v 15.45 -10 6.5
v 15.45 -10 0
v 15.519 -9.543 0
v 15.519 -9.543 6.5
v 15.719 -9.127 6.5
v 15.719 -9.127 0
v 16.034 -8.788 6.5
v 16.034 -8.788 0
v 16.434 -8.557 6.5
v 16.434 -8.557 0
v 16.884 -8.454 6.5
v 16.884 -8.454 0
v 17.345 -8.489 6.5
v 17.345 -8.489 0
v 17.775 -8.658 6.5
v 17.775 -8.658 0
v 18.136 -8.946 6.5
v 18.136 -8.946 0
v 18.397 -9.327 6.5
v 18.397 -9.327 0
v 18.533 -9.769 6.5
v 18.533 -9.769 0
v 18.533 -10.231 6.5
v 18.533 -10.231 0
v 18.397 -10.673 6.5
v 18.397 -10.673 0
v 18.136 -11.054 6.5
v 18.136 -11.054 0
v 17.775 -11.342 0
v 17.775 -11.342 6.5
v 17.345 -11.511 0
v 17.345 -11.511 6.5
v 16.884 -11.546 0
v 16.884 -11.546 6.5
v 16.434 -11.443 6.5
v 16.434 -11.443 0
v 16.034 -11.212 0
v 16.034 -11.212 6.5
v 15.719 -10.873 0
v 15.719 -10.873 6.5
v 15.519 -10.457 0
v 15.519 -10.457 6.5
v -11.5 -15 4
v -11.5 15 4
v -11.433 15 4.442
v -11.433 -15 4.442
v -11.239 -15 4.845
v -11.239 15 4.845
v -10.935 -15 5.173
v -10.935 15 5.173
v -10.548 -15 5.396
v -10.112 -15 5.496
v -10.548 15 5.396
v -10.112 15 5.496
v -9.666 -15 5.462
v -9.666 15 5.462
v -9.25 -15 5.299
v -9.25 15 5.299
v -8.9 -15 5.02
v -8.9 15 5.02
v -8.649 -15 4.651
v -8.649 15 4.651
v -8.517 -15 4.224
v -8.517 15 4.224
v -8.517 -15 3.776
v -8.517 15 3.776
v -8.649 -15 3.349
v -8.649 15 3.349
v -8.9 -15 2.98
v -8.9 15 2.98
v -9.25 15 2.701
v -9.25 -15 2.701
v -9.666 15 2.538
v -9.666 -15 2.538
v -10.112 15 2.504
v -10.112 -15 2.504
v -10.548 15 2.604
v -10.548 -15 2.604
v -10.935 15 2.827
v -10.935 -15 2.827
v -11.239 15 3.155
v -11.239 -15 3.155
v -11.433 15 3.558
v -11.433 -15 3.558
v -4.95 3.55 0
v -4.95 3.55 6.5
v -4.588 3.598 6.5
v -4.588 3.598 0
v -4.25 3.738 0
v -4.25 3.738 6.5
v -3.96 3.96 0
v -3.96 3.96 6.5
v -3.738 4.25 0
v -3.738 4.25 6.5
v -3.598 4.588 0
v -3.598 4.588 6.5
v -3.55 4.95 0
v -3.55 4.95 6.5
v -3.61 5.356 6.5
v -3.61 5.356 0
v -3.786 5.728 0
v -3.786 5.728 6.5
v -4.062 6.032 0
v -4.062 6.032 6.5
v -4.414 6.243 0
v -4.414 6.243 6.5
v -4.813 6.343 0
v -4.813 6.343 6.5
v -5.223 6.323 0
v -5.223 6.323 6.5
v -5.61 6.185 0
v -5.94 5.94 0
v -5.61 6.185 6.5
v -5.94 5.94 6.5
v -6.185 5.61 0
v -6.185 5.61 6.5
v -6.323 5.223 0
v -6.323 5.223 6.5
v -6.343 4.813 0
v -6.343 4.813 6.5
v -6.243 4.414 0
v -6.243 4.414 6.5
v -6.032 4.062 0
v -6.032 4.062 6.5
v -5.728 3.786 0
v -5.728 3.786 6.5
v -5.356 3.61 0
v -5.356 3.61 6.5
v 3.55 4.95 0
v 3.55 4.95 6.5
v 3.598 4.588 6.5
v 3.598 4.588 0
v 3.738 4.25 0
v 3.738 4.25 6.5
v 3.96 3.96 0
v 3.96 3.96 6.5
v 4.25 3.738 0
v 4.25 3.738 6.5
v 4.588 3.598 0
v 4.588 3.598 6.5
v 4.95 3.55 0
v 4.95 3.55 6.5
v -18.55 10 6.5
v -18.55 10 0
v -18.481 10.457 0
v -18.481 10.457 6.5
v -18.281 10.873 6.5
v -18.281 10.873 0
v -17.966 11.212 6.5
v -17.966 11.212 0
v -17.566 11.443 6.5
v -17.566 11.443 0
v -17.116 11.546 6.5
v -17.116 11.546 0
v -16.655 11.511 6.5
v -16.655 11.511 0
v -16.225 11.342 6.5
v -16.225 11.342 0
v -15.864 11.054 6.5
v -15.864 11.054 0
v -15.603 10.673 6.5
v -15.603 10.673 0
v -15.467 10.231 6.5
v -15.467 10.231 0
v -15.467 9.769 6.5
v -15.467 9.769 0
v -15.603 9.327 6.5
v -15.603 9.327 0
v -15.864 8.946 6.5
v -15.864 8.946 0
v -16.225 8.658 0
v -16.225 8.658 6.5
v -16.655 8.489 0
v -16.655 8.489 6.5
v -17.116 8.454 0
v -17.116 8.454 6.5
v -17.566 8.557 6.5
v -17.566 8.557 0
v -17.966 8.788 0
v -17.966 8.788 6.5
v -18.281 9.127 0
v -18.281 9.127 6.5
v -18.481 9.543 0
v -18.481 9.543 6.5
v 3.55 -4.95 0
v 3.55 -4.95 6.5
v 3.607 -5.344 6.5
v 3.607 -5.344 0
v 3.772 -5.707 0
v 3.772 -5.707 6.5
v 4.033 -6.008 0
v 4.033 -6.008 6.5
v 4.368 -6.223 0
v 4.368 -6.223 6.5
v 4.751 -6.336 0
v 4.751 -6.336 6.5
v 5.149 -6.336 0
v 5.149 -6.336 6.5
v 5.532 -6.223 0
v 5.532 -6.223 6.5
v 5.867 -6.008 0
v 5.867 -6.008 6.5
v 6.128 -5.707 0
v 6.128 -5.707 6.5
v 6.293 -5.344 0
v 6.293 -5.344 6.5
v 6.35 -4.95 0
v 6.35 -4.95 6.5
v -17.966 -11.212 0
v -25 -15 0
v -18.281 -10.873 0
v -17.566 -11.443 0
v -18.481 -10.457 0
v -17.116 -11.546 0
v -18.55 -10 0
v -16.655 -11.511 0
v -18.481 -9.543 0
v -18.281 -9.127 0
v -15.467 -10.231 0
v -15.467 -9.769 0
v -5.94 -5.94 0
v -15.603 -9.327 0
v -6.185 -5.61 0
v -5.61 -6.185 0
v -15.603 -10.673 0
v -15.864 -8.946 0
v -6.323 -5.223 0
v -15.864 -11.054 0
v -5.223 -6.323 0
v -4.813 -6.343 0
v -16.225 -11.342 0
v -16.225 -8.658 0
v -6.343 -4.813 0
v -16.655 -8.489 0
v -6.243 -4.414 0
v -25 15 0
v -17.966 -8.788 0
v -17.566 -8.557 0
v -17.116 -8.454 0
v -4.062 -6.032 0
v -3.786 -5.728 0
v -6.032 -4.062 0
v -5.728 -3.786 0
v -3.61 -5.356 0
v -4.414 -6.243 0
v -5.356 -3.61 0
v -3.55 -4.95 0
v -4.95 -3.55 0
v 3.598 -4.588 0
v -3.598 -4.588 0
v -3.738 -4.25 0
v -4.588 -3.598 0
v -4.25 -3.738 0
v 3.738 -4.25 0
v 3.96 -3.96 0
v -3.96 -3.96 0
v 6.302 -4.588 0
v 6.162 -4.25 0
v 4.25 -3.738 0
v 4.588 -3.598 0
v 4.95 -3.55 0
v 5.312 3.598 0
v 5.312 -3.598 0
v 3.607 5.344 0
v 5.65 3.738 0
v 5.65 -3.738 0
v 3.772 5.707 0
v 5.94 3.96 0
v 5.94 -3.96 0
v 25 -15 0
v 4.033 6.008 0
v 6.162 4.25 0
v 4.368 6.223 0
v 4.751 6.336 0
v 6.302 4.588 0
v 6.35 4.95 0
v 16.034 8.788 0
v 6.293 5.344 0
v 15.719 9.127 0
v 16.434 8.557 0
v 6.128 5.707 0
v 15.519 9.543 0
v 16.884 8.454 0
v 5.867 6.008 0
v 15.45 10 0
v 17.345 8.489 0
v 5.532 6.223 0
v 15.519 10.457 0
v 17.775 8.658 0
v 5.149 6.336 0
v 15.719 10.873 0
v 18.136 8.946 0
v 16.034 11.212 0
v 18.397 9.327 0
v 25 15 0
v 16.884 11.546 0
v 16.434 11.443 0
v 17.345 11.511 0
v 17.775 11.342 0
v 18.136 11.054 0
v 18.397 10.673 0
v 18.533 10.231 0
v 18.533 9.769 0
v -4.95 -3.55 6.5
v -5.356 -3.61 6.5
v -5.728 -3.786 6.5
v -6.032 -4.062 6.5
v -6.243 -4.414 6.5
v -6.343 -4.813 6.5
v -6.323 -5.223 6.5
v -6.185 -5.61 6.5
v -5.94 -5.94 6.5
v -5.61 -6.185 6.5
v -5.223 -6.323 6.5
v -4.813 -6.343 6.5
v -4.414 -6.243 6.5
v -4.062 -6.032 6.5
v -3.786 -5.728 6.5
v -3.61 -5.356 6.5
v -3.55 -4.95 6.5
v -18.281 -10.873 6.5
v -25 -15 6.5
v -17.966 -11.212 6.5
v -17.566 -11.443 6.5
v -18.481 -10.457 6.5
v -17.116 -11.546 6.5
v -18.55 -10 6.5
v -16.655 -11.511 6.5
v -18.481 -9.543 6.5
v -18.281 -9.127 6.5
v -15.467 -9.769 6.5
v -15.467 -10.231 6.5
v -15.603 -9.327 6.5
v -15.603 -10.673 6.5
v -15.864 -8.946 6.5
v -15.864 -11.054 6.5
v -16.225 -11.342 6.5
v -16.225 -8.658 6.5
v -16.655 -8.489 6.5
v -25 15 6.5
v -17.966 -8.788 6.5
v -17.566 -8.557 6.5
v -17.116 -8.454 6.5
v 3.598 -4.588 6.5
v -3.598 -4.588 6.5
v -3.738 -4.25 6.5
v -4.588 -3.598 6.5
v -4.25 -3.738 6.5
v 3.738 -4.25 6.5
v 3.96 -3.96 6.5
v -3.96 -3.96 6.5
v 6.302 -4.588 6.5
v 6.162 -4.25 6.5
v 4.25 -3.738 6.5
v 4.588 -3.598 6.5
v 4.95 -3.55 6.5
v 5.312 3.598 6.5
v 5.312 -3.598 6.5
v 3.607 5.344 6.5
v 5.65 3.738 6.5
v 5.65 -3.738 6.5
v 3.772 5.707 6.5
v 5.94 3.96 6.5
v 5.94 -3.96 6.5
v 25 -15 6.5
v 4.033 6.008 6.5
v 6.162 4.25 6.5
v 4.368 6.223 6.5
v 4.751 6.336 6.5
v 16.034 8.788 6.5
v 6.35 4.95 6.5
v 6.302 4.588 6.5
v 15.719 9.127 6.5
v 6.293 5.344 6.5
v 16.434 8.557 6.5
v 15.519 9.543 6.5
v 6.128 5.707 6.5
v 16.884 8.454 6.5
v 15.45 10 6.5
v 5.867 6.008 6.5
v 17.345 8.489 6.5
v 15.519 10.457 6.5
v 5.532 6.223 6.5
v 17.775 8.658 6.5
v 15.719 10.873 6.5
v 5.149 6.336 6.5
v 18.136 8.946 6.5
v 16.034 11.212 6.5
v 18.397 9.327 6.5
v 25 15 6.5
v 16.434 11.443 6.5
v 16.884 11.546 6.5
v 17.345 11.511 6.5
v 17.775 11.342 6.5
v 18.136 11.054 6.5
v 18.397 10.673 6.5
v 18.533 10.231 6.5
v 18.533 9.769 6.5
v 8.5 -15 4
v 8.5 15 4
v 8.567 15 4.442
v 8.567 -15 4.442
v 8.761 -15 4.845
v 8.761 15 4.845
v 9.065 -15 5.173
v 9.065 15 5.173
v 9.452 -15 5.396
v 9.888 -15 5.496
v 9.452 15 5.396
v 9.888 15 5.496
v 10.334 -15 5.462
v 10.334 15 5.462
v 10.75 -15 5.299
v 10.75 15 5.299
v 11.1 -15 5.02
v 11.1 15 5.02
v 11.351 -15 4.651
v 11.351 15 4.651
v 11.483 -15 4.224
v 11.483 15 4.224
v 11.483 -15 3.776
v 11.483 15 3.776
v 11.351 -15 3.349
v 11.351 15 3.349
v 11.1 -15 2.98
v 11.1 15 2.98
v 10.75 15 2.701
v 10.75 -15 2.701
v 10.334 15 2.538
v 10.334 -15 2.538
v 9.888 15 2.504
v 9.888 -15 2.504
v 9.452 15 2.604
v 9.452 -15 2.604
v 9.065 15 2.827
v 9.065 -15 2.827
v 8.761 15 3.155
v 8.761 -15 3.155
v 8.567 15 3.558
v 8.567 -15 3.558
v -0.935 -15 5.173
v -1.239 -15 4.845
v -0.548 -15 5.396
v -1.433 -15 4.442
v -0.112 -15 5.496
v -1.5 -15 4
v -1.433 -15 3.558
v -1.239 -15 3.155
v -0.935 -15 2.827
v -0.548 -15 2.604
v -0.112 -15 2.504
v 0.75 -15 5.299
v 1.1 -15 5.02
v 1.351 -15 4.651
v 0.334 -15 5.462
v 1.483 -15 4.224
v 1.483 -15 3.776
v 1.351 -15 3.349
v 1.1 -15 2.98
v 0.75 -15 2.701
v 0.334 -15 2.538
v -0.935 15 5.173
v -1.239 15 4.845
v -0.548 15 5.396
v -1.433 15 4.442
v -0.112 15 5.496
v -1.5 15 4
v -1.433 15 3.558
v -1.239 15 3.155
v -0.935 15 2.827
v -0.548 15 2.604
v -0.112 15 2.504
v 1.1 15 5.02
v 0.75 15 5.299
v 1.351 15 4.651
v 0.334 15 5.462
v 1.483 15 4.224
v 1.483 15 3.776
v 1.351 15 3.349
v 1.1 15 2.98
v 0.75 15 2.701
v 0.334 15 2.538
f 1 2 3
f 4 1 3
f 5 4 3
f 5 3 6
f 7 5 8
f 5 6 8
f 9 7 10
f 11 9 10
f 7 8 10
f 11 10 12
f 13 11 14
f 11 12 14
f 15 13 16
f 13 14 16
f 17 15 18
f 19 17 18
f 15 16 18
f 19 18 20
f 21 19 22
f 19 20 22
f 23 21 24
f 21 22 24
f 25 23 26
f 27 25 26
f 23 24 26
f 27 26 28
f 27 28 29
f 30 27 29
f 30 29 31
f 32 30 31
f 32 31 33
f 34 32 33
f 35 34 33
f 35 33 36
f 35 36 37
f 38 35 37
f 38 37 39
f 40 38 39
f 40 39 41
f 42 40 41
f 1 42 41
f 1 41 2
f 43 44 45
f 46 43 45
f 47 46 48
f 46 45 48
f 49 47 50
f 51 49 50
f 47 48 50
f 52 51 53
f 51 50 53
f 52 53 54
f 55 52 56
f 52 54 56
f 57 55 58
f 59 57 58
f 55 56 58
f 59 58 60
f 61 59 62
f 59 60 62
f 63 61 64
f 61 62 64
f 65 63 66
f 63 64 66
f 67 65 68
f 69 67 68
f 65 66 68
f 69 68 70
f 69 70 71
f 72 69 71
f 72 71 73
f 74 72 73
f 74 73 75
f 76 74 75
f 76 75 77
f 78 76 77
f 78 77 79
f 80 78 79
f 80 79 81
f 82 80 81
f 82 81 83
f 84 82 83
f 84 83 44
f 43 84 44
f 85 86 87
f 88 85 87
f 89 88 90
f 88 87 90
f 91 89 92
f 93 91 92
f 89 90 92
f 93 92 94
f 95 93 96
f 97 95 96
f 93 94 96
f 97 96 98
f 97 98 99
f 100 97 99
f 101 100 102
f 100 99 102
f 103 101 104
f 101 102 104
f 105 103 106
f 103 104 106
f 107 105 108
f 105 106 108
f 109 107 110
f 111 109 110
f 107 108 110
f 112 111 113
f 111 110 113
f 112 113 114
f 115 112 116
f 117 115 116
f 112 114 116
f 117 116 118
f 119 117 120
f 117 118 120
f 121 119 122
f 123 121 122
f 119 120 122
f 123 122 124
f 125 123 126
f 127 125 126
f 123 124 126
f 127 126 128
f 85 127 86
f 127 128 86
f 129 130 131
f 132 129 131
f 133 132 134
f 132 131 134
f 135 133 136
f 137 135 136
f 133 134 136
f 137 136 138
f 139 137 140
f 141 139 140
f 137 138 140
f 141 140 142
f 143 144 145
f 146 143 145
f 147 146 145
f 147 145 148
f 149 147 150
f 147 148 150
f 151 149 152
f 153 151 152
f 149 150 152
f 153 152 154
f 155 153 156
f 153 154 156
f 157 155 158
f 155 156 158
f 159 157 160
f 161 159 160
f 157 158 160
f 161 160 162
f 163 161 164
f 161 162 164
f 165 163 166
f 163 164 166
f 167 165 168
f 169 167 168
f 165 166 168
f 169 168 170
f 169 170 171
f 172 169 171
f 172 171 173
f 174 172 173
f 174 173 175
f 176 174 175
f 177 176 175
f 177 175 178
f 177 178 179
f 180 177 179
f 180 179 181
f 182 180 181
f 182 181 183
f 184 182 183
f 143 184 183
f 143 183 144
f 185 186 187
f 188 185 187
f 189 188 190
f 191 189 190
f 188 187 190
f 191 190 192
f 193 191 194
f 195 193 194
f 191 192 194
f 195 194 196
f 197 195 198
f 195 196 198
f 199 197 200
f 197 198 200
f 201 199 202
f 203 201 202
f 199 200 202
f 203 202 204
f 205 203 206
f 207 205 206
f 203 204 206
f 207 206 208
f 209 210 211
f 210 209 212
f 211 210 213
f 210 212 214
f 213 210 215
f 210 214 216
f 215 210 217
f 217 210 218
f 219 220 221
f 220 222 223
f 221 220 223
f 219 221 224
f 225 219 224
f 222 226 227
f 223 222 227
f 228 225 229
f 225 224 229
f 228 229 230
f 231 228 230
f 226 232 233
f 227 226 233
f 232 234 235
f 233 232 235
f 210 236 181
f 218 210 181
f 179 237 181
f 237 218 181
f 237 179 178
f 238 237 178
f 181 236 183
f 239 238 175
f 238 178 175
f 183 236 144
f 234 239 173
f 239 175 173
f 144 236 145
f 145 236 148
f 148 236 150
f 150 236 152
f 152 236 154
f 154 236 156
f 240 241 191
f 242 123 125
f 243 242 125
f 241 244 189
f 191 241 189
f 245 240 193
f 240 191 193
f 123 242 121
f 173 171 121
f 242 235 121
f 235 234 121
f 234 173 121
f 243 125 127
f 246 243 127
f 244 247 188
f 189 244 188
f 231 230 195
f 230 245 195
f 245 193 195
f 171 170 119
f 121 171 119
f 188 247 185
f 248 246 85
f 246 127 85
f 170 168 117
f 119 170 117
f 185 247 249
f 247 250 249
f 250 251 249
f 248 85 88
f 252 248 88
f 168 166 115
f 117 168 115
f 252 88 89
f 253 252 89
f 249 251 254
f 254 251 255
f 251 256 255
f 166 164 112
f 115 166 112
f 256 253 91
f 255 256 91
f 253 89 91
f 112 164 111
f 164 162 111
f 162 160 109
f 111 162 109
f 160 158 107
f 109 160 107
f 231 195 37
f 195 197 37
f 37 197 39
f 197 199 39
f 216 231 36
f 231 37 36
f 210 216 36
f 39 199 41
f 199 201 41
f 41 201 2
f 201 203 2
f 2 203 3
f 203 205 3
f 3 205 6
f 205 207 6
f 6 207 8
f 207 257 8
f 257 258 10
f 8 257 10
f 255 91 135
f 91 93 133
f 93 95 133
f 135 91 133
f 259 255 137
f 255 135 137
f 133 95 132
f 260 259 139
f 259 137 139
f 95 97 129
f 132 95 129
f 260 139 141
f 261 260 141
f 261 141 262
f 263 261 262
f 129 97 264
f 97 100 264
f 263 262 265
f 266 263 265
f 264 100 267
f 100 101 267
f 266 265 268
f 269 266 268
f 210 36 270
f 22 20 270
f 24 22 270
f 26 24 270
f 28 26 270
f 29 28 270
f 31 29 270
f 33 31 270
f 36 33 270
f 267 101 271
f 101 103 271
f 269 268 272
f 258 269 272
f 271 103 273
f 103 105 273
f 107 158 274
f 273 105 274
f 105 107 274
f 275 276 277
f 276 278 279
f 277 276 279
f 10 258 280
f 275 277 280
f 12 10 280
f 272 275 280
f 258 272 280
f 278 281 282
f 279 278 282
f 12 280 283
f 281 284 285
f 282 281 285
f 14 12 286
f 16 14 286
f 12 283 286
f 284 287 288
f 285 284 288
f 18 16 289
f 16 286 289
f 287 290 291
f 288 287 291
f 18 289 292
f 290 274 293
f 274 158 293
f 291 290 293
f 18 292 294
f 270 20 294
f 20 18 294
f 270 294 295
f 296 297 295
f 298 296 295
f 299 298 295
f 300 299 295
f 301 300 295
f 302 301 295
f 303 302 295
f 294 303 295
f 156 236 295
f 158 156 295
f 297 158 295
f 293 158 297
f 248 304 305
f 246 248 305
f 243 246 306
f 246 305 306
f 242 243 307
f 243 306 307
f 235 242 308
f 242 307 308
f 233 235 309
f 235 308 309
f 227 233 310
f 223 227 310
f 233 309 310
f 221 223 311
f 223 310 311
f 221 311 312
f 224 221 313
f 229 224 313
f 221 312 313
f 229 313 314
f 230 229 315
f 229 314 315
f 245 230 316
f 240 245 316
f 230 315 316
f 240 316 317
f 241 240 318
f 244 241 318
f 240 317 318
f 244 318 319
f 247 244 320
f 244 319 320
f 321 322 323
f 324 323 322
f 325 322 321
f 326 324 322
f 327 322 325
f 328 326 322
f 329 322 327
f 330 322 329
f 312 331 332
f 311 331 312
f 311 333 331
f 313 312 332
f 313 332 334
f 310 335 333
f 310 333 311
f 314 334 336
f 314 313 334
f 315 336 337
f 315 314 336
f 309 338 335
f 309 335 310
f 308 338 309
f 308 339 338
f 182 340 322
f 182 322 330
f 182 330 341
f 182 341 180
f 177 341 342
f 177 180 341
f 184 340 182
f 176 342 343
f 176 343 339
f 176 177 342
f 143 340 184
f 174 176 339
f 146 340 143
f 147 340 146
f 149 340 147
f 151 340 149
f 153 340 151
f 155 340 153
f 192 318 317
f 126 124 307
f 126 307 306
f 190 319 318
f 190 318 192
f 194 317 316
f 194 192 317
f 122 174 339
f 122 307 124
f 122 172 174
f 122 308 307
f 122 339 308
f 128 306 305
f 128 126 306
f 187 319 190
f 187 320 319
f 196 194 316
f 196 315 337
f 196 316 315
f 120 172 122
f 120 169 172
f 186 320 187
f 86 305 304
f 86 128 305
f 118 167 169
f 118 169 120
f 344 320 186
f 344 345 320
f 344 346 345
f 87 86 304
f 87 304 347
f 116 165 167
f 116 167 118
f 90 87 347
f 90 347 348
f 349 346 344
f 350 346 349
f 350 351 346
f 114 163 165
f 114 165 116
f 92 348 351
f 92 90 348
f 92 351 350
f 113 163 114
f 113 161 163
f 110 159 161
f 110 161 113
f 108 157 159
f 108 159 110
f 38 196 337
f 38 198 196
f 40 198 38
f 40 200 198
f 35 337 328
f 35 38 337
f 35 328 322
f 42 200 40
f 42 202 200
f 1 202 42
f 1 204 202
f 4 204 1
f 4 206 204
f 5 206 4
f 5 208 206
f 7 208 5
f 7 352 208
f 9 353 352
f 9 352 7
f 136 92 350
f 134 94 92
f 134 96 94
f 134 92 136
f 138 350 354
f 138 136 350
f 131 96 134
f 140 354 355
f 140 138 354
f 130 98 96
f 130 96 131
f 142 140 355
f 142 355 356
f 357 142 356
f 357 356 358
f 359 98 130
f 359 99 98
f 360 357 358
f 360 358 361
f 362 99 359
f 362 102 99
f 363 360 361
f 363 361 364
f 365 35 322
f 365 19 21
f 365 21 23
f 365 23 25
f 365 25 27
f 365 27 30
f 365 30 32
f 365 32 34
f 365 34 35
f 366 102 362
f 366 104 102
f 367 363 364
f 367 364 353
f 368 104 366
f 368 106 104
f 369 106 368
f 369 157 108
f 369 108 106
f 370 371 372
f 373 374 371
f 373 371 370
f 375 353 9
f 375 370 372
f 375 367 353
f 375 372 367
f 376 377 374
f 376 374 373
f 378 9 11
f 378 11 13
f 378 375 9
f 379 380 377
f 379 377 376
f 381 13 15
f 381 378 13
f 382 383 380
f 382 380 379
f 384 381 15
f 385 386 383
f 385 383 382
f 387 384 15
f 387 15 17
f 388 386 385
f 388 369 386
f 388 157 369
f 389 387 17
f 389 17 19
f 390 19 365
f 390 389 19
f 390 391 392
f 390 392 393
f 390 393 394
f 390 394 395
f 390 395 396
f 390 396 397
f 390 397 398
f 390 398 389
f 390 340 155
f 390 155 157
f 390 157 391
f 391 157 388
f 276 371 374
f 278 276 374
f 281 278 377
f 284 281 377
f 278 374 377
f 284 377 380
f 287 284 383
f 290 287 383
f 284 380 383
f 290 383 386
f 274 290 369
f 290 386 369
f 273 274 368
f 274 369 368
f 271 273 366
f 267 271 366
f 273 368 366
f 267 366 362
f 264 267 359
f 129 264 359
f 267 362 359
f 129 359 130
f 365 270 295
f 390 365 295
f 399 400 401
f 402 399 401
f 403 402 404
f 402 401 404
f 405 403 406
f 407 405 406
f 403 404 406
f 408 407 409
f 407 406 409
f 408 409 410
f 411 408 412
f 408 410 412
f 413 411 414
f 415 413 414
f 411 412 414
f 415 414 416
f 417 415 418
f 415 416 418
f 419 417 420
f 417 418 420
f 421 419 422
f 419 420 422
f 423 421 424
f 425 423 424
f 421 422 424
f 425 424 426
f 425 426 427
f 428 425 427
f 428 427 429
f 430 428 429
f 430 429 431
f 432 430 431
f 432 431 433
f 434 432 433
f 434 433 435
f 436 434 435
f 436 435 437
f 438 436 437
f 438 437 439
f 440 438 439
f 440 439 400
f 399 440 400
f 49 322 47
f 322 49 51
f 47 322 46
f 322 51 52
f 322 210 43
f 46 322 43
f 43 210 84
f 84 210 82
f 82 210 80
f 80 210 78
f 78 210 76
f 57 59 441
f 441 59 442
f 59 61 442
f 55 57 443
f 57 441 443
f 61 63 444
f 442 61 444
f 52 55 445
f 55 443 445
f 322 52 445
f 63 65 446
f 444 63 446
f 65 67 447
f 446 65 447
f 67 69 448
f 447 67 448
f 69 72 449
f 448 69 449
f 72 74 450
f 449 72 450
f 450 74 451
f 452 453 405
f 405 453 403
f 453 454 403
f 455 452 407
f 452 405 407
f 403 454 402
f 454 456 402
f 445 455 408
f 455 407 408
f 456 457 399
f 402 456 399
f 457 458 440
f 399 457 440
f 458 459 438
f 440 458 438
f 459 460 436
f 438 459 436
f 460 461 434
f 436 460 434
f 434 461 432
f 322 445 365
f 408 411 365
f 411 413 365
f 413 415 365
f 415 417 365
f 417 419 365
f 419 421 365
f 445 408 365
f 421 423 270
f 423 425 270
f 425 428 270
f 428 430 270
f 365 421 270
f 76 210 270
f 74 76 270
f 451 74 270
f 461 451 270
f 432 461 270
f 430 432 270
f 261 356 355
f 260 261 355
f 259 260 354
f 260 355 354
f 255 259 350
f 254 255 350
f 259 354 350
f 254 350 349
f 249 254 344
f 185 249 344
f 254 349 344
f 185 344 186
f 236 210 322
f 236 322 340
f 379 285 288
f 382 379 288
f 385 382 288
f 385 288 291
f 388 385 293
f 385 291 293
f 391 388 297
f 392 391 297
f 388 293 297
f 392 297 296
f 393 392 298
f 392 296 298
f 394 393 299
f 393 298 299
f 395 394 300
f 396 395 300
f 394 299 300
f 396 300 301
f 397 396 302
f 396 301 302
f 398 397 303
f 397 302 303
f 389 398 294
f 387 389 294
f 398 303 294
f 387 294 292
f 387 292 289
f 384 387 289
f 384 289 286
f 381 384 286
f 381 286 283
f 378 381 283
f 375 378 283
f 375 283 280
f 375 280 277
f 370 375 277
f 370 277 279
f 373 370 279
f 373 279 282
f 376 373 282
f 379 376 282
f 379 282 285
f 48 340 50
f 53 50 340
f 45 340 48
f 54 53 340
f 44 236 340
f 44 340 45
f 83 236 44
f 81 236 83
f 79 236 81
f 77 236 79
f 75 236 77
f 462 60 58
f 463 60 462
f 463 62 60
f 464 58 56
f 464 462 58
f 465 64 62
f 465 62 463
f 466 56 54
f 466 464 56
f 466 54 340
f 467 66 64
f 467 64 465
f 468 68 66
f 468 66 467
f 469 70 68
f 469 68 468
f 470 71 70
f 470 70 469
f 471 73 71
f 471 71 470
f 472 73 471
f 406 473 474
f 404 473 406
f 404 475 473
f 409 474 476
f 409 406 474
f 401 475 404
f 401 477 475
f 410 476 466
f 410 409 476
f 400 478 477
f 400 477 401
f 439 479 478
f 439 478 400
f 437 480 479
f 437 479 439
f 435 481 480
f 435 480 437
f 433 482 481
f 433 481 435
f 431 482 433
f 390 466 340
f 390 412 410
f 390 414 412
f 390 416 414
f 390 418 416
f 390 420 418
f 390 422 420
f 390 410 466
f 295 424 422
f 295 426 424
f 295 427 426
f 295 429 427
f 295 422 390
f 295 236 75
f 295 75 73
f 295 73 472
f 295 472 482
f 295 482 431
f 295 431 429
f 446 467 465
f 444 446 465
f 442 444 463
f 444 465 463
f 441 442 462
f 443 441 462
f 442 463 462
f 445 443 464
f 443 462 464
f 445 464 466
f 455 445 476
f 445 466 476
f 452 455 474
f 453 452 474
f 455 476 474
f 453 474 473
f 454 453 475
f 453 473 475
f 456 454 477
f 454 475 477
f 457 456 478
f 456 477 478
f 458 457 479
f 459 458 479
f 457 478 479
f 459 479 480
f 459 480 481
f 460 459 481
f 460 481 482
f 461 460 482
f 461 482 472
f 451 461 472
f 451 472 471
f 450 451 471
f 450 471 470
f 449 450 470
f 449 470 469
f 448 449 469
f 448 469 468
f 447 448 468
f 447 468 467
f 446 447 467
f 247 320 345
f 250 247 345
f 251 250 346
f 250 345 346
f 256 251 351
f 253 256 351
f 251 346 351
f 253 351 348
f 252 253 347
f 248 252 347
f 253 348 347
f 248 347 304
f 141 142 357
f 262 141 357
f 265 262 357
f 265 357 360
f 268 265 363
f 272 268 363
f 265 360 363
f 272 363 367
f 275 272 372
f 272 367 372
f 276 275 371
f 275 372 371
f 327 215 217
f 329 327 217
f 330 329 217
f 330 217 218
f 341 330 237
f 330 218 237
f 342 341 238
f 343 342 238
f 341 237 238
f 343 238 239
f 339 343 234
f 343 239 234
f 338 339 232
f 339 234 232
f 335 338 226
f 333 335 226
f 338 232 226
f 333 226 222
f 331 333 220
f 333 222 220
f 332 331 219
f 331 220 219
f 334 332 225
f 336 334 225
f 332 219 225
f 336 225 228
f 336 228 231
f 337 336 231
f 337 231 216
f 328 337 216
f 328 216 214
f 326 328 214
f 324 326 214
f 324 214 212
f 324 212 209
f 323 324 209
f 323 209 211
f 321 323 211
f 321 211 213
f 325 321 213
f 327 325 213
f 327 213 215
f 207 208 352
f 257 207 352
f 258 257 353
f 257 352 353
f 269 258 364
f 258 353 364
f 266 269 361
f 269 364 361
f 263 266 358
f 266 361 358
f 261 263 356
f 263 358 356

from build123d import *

# Parameters (mm, degrees)
SKETCH_1_W          = 50
SKETCH_1_H          = 30
EXTRUDE_1_DEPTH     = 6.5
CUT_EXTRUDE_1_DEPTH = 30.870554062
SKETCH_4_R          = 1.55
CUT_EXTRUDE_2_DEPTH = 30.870554062
SKETCH_5_R          = 1.5
CUT_EXTRUDE_3_DEPTH = 40.588508434


with BuildPart() as part:
    # 草图1 → 凸台-拉伸1 (new body)
    with BuildSketch(Plane.XY):
        Rectangle(SKETCH_1_W, SKETCH_1_H)
    extrude(amount=EXTRUDE_1_DEPTH)

    # 草图2 → 切除-拉伸1 (cut, through all)
    with BuildSketch(Plane.XY.offset(6.5)):
        with BuildLine():
            ThreePointArc((-3.55, 4.95), (-5.939949494, 5.939949494), (-4.95, 3.55))
            Line((-4.95, 3.55), (-4.95, 4.95))
            Line((-4.95, 4.95), (-3.55, 4.95))
        make_face()
        with BuildLine():
            Line((-4.95, 4.95), (-4.95, 3.55))
            ThreePointArc((-4.95, 3.55), (-3.960050506, 3.960050506), (-3.55, 4.95))
            Line((-3.55, 4.95), (-4.95, 4.95))
        make_face()
        with BuildLine():
            ThreePointArc((3.55, 4.95), (3.960050506, 3.960050506), (4.95, 3.55))
            Line((4.95, 3.55), (4.95, 4.95))
            Line((4.95, 4.95), (3.55, 4.95))
        make_face()
        with BuildLine():
            Line((4.95, 4.95), (4.95, 3.55))
            ThreePointArc((4.95, 3.55), (5.939949494, 3.960050506), (6.35, 4.95))
            ThreePointArc((6.35, 4.95), (4.95, 6.35), (3.55, 4.95))
            Line((3.55, 4.95), (4.95, 4.95))
        make_face()
        with BuildLine():
            ThreePointArc((4.95, -3.55), (3.960050506, -3.960050506), (3.55, -4.95))
            Line((3.55, -4.95), (4.95, -4.95))
            Line((4.95, -4.95), (4.95, -3.55))
        make_face()
        with BuildLine():
            Line((4.95, -4.95), (3.55, -4.95))
            ThreePointArc((3.55, -4.95), (4.95, -6.35), (6.35, -4.95))
            ThreePointArc((6.35, -4.95), (5.939949494, -3.960050506), (4.95, -3.55))
            Line((4.95, -3.55), (4.95, -4.95))
        make_face()
        with BuildLine():
            ThreePointArc((-4.95, -3.55), (-5.939949494, -5.939949494), (-3.55, -4.95))
            Line((-3.55, -4.95), (-4.95, -4.95))
            Line((-4.95, -4.95), (-4.95, -3.55))
        make_face()
        with BuildLine():
            Line((-4.95, -4.95), (-3.55, -4.95))
            ThreePointArc((-3.55, -4.95), (-3.960050506, -3.960050506), (-4.95, -3.55))
            Line((-4.95, -3.55), (-4.95, -4.95))
        make_face()
    extrude(amount=-CUT_EXTRUDE_1_DEPTH, mode=Mode.SUBTRACT)

    # 草图4 → 切除-拉伸2 (cut, through all)
    with BuildSketch(Plane(origin=(0, 0, 0), x_dir=(-1, 0, 0), z_dir=(0, 0, -1))):
        with Locations((-17, 10)):
            Circle(SKETCH_4_R)
        with Locations((-17, -10)):
            Circle(SKETCH_4_R)
        with Locations((17, -10)):
            Circle(SKETCH_4_R)
        with Locations((17, 10)):
            Circle(SKETCH_4_R)
    extrude(amount=-CUT_EXTRUDE_2_DEPTH, mode=Mode.SUBTRACT)

    # 草图5 → 切除-拉伸3 (cut, through all)
    with BuildSketch(Plane(origin=(0, 15, 0), x_dir=(1, 0, 0), z_dir=(0, 1, 0))):
        with Locations(Location((-10, -4, 0), (0, 0, 180))):
            Circle(SKETCH_5_R)
        with Locations(Location((0, -4, 0), (0, 0, 180))):
            Circle(SKETCH_5_R)
        with Locations(Location((10, -4, 0), (0, 0, 180))):
            Circle(SKETCH_5_R)
    extrude(amount=-CUT_EXTRUDE_3_DEPTH, mode=Mode.SUBTRACT)


solid = part.part
